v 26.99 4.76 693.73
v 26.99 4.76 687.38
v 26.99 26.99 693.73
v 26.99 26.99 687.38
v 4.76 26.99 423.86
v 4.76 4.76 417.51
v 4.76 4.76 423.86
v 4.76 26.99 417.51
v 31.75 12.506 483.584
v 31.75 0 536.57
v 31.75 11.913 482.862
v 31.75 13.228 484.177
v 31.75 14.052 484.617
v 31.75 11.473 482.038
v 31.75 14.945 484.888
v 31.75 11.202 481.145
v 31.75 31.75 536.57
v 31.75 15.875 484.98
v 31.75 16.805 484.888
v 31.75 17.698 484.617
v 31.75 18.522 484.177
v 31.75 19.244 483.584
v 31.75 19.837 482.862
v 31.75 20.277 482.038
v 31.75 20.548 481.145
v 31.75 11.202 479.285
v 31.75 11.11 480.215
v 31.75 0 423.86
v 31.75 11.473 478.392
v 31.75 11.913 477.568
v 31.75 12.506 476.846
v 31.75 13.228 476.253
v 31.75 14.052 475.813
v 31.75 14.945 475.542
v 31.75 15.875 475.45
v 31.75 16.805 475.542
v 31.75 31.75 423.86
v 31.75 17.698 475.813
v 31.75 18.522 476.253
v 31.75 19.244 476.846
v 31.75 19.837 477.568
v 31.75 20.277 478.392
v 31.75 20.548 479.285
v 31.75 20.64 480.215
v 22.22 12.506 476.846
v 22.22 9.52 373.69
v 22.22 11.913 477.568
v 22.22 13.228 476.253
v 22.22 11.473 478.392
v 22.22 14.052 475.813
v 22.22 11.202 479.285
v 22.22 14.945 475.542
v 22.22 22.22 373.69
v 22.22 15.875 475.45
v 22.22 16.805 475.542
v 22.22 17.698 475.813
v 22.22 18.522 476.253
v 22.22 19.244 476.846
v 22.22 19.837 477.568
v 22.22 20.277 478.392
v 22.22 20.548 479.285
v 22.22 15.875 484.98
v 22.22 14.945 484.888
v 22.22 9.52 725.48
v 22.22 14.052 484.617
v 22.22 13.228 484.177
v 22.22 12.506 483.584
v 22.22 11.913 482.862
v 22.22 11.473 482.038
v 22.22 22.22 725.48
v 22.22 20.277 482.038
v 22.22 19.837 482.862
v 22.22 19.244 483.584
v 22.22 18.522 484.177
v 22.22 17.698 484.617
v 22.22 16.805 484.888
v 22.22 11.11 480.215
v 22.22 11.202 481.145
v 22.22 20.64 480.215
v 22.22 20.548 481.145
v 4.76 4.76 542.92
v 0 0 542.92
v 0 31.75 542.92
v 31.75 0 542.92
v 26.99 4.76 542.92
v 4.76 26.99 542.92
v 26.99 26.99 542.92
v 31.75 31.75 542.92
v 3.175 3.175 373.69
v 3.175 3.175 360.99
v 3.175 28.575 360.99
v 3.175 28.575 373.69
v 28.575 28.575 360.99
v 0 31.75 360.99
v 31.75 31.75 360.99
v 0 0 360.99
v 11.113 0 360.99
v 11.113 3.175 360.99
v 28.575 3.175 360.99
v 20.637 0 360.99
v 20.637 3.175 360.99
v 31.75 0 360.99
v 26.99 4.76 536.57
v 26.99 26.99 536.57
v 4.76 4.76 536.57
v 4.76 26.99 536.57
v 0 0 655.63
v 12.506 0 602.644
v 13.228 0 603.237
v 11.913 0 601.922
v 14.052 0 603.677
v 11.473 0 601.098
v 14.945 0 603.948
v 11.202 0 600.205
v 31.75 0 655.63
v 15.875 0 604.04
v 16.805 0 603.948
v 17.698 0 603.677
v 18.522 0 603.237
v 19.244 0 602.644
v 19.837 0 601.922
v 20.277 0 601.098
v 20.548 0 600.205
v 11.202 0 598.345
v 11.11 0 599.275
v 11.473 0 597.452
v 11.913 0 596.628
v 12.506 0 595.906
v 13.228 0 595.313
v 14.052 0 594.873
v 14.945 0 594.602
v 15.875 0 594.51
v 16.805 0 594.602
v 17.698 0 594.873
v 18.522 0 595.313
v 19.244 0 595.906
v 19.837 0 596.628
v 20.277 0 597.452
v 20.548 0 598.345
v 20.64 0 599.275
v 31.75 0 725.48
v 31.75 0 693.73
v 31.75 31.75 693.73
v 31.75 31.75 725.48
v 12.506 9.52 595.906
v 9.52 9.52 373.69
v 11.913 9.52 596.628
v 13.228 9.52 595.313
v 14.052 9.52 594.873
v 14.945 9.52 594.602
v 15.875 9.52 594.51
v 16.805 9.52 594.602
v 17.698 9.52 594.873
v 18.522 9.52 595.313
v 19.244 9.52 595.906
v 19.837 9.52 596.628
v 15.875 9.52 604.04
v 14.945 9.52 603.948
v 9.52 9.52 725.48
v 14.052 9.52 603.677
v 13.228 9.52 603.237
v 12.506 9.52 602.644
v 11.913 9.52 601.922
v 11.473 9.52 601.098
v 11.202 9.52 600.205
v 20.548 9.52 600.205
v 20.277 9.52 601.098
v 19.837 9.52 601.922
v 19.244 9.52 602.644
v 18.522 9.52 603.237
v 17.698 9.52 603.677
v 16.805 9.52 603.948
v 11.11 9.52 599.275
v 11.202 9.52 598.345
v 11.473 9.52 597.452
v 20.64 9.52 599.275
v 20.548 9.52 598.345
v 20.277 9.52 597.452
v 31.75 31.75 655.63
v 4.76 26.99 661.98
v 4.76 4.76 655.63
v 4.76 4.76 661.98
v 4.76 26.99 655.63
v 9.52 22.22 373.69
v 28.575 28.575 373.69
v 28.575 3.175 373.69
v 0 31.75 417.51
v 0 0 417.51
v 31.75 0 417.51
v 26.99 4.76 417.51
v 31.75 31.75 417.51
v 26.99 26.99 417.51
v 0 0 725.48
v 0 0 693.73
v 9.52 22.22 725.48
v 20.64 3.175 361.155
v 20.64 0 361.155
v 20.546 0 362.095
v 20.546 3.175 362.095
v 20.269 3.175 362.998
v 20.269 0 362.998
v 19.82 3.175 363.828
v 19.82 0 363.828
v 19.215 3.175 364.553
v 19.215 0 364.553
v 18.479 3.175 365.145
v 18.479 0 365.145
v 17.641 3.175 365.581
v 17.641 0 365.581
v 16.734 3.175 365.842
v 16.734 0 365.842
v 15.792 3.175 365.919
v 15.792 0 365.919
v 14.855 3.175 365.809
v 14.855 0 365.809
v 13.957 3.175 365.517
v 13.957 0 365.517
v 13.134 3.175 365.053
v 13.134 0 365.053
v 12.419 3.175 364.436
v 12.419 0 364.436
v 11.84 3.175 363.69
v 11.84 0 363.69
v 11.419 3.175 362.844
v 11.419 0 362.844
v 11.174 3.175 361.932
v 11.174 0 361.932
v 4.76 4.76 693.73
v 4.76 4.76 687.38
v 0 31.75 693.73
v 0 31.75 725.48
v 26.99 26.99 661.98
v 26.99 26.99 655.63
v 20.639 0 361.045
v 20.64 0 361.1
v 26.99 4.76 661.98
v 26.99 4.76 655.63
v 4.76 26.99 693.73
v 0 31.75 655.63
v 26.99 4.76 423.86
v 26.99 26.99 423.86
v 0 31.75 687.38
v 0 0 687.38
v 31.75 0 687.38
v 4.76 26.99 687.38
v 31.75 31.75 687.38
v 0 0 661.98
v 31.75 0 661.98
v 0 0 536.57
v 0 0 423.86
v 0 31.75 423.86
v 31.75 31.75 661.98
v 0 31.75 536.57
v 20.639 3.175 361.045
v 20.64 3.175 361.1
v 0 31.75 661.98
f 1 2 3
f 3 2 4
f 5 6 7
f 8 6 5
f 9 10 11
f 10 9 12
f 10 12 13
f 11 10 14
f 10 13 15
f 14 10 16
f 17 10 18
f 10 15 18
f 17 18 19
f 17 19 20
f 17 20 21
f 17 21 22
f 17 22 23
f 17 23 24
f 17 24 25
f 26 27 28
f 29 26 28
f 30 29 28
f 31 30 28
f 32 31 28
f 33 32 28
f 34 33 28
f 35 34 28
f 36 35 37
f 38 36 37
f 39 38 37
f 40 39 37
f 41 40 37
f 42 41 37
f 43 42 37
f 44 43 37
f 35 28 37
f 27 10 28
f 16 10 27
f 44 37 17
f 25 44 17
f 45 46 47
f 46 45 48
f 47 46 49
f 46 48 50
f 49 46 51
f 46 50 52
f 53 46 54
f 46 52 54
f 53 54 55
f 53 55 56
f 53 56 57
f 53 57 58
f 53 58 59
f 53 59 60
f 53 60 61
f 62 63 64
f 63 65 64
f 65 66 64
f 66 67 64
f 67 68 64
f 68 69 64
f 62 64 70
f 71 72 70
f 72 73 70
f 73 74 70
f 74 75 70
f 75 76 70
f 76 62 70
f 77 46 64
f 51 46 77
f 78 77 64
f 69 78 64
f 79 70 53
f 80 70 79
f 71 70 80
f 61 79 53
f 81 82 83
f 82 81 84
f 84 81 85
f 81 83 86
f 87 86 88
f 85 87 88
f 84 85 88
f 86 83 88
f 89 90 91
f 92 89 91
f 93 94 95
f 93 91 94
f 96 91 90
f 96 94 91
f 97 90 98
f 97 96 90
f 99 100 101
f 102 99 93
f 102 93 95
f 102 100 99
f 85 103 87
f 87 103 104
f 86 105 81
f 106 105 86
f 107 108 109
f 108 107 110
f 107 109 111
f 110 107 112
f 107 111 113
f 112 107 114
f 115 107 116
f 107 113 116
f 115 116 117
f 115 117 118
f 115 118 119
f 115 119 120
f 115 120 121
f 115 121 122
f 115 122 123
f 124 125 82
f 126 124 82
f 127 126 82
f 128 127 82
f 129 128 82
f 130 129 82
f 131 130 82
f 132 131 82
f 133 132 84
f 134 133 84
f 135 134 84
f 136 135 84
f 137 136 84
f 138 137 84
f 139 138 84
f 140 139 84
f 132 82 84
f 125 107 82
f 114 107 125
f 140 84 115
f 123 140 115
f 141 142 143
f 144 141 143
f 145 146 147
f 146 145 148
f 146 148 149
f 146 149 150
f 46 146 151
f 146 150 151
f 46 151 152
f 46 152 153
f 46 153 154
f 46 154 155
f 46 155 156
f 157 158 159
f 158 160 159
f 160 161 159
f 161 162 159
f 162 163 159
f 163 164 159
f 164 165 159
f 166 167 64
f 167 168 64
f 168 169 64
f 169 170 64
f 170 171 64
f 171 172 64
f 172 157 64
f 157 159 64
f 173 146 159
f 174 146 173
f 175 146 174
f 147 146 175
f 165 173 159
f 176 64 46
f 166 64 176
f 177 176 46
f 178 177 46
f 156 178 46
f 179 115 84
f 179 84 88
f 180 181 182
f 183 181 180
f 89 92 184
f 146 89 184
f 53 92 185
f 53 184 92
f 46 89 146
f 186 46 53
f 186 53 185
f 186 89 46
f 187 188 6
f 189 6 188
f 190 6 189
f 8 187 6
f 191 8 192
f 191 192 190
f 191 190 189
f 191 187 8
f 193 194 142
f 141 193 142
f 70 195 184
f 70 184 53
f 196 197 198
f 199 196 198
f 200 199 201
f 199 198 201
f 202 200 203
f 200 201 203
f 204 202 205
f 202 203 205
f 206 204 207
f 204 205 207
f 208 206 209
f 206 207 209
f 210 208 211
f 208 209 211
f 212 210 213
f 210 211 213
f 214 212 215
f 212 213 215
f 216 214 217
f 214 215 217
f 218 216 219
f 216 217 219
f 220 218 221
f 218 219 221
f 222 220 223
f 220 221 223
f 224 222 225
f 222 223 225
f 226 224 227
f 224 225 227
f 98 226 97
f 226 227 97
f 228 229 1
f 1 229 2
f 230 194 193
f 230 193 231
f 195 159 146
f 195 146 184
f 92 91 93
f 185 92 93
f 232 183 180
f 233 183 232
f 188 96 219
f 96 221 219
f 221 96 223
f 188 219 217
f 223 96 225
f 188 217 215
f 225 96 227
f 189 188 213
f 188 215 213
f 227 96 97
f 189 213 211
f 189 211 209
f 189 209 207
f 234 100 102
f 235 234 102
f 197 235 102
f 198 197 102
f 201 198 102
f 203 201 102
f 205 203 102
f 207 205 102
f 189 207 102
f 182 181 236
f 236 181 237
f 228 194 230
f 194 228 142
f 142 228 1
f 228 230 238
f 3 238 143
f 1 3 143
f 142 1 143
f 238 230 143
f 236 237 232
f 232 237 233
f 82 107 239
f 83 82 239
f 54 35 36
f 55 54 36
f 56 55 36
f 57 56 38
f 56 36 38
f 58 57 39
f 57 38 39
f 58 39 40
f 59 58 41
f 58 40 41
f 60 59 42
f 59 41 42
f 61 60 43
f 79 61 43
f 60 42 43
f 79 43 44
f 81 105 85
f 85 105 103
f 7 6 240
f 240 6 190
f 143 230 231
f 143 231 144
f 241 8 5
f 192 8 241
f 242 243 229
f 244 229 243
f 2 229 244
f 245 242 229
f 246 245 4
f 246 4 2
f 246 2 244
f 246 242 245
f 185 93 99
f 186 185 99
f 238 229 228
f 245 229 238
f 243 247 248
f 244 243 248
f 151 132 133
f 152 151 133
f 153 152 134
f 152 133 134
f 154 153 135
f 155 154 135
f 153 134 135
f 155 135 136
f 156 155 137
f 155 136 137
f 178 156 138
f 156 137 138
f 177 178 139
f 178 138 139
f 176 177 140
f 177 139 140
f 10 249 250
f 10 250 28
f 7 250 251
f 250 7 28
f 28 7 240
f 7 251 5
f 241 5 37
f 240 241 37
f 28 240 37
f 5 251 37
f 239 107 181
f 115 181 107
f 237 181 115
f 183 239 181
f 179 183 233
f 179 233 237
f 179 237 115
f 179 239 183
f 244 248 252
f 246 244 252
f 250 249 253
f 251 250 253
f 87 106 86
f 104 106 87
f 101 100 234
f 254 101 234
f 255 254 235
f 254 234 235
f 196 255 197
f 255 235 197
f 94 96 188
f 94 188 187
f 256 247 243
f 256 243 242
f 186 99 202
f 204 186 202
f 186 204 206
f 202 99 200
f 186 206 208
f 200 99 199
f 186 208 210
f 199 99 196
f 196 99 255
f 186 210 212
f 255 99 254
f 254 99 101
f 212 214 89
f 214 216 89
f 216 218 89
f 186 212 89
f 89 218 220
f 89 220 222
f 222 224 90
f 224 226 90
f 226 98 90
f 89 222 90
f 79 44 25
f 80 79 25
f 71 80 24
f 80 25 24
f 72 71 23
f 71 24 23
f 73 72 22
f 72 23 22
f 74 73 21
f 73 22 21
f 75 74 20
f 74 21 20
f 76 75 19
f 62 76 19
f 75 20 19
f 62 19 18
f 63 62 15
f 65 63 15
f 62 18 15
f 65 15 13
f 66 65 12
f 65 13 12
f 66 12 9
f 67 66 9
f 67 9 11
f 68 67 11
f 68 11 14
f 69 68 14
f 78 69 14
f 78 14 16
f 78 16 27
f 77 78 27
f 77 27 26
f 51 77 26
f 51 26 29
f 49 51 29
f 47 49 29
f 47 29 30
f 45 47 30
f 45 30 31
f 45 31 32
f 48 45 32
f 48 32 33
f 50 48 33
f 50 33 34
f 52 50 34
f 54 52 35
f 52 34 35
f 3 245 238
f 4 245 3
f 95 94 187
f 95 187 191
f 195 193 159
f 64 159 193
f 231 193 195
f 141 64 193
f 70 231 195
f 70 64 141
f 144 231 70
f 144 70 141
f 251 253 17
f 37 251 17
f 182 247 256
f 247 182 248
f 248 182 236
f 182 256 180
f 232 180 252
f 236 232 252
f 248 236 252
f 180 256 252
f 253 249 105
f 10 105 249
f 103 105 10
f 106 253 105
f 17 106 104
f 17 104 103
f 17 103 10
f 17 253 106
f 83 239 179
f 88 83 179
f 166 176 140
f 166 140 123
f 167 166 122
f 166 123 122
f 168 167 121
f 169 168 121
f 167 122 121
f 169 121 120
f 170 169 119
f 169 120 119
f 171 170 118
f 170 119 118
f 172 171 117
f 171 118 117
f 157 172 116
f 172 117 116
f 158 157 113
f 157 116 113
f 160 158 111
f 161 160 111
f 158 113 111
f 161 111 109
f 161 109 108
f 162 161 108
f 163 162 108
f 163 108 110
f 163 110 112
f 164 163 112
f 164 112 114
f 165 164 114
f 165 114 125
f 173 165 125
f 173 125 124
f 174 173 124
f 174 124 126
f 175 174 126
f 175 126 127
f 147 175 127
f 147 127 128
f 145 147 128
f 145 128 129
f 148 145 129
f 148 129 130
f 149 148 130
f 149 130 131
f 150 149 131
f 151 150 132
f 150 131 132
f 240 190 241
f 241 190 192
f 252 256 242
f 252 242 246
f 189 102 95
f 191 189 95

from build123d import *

# Parameters (mm, degrees)
F0_W      = 31.75
F0_H      = 31.75
F1_DEPTH  = 60.33
F2_W      = 22.23
F2_H      = 22.23
F3_DEPTH  = 6.35
F4_W      = 31.75
F4_H      = 31.75
F5_DEPTH  = 112.71
F6_W      = 22.23
F6_H      = 22.23
F7_DEPTH  = 6.35
F8_W      = 31.75
F8_H      = 31.75
F8_W_2    = 22.23
F8_H_2    = 22.23
F9_DEPTH  = 112.71
F10_W     = 22.23
F10_H     = 22.23
F11_DEPTH = 6.35
F12_W     = 31.75
F12_H     = 31.75
F12_W_2   = 22.23
F12_H_2   = 22.23
F13_DEPTH = 112.71
F14_W     = 22.23
F14_H     = 22.23
F15_DEPTH = 6.35
F16_W     = 31.75
F16_H     = 31.75
F17_DEPTH = 112.71
F18_W     = 22.23
F18_H     = 22.23
F19_DEPTH = 6.35
F20_W     = 31.75
F20_H     = 31.75
F20_W_2   = 22.23
F20_H_2   = 22.23
F21_DEPTH = 112.71
F22_W     = 22.23
F22_H     = 22.23
F23_DEPTH = 6.35
F24_W     = 31.75
F24_H     = 31.75
F24_W_2   = 22.23
F24_H_2   = 22.23
F25_DEPTH = 25.4
F26_W     = 22.23
F26_H     = 22.23
F27_DEPTH = 6.35
F28_W     = 31.75
F28_H     = 31.75
F28_W_2   = 22.23
F28_H_2   = 22.23
F29_DEPTH = 31.75
F32_DEPTH = 12.7
F34_DEPTH = 12.7
F36_DEPTH = 12.7
F38_DEPTH = 12.7
F40_DEPTH = 12.7
F41_W     = 12.7
F41_H     = 12.7
F42_DEPTH = 736.6
F43_DEPTH = 6.35
F44_W     = 31.75
F44_H     = 360.990007
F45_DEPTH = 76.2
F47_DEPTH = 12.7


with BuildPart() as f1:
    # F0 (on Top) → F1 (new body)
    with BuildSketch(Plane.XY):
        with Locations((15.875, 15.875)):
            Rectangle(F0_W, F0_H)
    extrude(amount=F1_DEPTH)

    # F2 (on face) → F3 (join)
    with BuildSketch(Plane.XY.offset(60.33)):
        with Locations((15.875, 15.875)):
            Rectangle(F2_W, F2_H)
    extrude(amount=F3_DEPTH)

    # F4 (on face) → F5 (join)
    with BuildSketch(Plane.XY.offset(66.68)):
        with Locations((15.875, 15.875)):
            Rectangle(F4_W, F4_H)
    extrude(amount=F5_DEPTH)

    # F6 (on face) → F7 (join)
    with BuildSketch(Plane.XY.offset(179.39)):
        with Locations((15.875, 15.875)):
            Rectangle(F6_W, F6_H)
    extrude(amount=F7_DEPTH)

    # F8 (on face) → F9 (join)
    with BuildSketch(Plane.XY.offset(185.74)):
        with Locations((15.875, 15.875)):
            Rectangle(F8_W, F8_H)
        with Locations((15.875, 15.875)):
            Rectangle(F8_W_2, F8_H_2, mode=Mode.SUBTRACT)
        with Locations((15.875, 15.875)):
            Rectangle(F8_W_2, F8_H_2)
    extrude(amount=F9_DEPTH)

    # F10 (on face) → F11 (join)
    with BuildSketch(Plane.XY.offset(298.45)):
        with Locations((15.875, 15.875)):
            Rectangle(F10_W, F10_H)
    extrude(amount=F11_DEPTH)

    # F12 (on face) → F13 (join)
    with BuildSketch(Plane.XY.offset(304.8)):
        with Locations((15.875, 15.875)):
            Rectangle(F12_W, F12_H)
        with Locations((15.875, 15.875)):
            Rectangle(F12_W_2, F12_H_2, mode=Mode.SUBTRACT)
        with Locations((15.875, 15.875)):
            Rectangle(F12_W_2, F12_H_2)
    extrude(amount=F13_DEPTH)

    # F14 (on face) → F15 (join)
    with BuildSketch(Plane.XY.offset(417.51)):
        with Locations((15.875, 15.875)):
            Rectangle(F14_W, F14_H)
    extrude(amount=F15_DEPTH)

    # F16 (on face) → F17 (join)
    with BuildSketch(Plane.XY.offset(423.86)):
        with Locations((15.875, 15.875)):
            Rectangle(F16_W, F16_H)
    extrude(amount=F17_DEPTH)

    # F18 (on face) → F19 (join)
    with BuildSketch(Plane.XY.offset(536.57)):
        with Locations((15.875, 15.875)):
            Rectangle(F18_W, F18_H)
    extrude(amount=F19_DEPTH)

    # F20 (on face) → F21 (join)
    with BuildSketch(Plane.XY.offset(542.92)):
        with Locations((15.875, 15.875)):
            Rectangle(F20_W, F20_H)
        with Locations((15.875, 15.875)):
            Rectangle(F20_W_2, F20_H_2, mode=Mode.SUBTRACT)
        with Locations((15.875, 15.875)):
            Rectangle(F20_W_2, F20_H_2)
    extrude(amount=F21_DEPTH)

    # F22 (on face) → F23 (join)
    with BuildSketch(Plane.XY.offset(655.63)):
        with Locations((15.875, 15.875)):
            Rectangle(F22_W, F22_H)
    extrude(amount=F23_DEPTH)

    # F24 (on face) → F25 (join)
    with BuildSketch(Plane.XY.offset(661.98)):
        with Locations((15.875, 15.875)):
            Rectangle(F24_W, F24_H)
        with Locations((15.875, 15.875)):
            Rectangle(F24_W_2, F24_H_2, mode=Mode.SUBTRACT)
        with Locations((15.875, 15.875)):
            Rectangle(F24_W_2, F24_H_2)
    extrude(amount=F25_DEPTH)

    # F26 (on face) → F27 (join)
    with BuildSketch(Plane.XY.offset(687.38)):
        with Locations((15.875, 15.875)):
            Rectangle(F26_W, F26_H)
    extrude(amount=F27_DEPTH)

    # F28 (on face) → F29 (join)
    with BuildSketch(Plane.XY.offset(693.73)):
        with Locations((15.875, 15.875)):
            Rectangle(F28_W, F28_H)
        with Locations((15.875, 15.875)):
            Rectangle(F28_W_2, F28_H_2, mode=Mode.SUBTRACT)
        with Locations((15.875, 15.875)):
            Rectangle(F28_W_2, F28_H_2)
    extrude(amount=F29_DEPTH)

    # F31 (on face) → F32 (cut)
    with BuildSketch(Plane.XZ):
        with BuildLine():
            Line((15.875, 123.035), (20.64, 123.035))
            ThreePointArc((20.64, 123.035), (12.5056361876, 126.4043638124), (15.875, 118.27))
            Line((15.875, 118.27), (15.875, 123.035))
        make_face()
        with BuildLine():
            ThreePointArc((15.875, 118.27), (19.2443638124, 119.6656361876), (20.64, 123.035))
            Line((20.64, 123.035), (15.875, 123.035))
            Line((15.875, 123.035), (15.875, 118.27))
        make_face()
    extrude(amount=-F32_DEPTH, mode=Mode.SUBTRACT)

    # F33 (on face) → F34 (cut)
    with BuildSketch(Plane.YZ.offset(31.75)):
        with BuildLine():
            Line((15.875, 242.095), (20.64, 242.095))
            ThreePointArc((20.64, 242.095), (12.5056361876, 245.4643638124), (15.875, 237.33))
            Line((15.875, 237.33), (15.875, 242.095))
        make_face()
        with BuildLine():
            ThreePointArc((15.875, 237.33), (19.2443638124, 238.7256361876), (20.64, 242.095))
            Line((20.64, 242.095), (15.875, 242.095))
            Line((15.875, 242.095), (15.875, 237.33))
        make_face()
    extrude(amount=-F34_DEPTH, mode=Mode.SUBTRACT)

    # F35 (on face) → F36 (cut)
    with BuildSketch(Plane.XZ):
        with BuildLine():
            Line((15.875, 361.155), (20.64, 361.155))
            ThreePointArc((20.64, 361.155), (12.5056361876, 364.5243638124), (15.875, 356.39))
            Line((15.875, 356.39), (15.875, 361.155))
        make_face()
        with BuildLine():
            ThreePointArc((15.875, 356.39), (19.2443638124, 357.7856361876), (20.64, 361.155))
            Line((20.64, 361.155), (15.875, 361.155))
            Line((15.875, 361.155), (15.875, 356.39))
        make_face()
    extrude(amount=-F36_DEPTH, mode=Mode.SUBTRACT)

    # F37 (on face) → F38 (cut)
    with BuildSketch(Plane.YZ.offset(31.75)):
        with BuildLine():
            Line((15.875, 480.215), (20.64, 480.215))
            ThreePointArc((20.64, 480.215), (12.5056361876, 483.5843638124), (15.875, 475.45))
            Line((15.875, 475.45), (15.875, 480.215))
        make_face()
        with BuildLine():
            ThreePointArc((15.875, 475.45), (19.2443638124, 476.8456361876), (20.64, 480.215))
            Line((20.64, 480.215), (15.875, 480.215))
            Line((15.875, 480.215), (15.875, 475.45))
        make_face()
    extrude(amount=-F38_DEPTH, mode=Mode.SUBTRACT)

    # F39 (on face) → F40 (cut)
    with BuildSketch(Plane.XZ):
        with BuildLine():
            Line((15.875, 599.275), (20.64, 599.275))
            ThreePointArc((20.64, 599.275), (12.5056361876, 602.6443638124), (15.875, 594.51))
            Line((15.875, 594.51), (15.875, 599.275))
        make_face()
        with BuildLine():
            ThreePointArc((15.875, 594.51), (19.2443638124, 595.9056361876), (20.64, 599.275))
            Line((20.64, 599.275), (15.875, 599.275))
            Line((15.875, 599.275), (15.875, 594.51))
        make_face()
    extrude(amount=-F40_DEPTH, mode=Mode.SUBTRACT)

    # F41 (on face) → F42 (cut)
    with BuildSketch(Plane.XY.offset(725.48)):
        with Locations((15.87, 15.87)):
            Rectangle(F41_W, F41_H)
    extrude(amount=-F42_DEPTH, mode=Mode.SUBTRACT)

    # F30 (on face) → F43 (cut)
    with BuildSketch(Plane(origin=(0, 0, 0), x_dir=(1, 0, 0), z_dir=(0, 0, -1))):
        with BuildLine():
            ThreePointArc((6.35, -15.875), (9.1398079092, -22.6101920908), (15.875, -25.4))
            Line((15.875, -25.4), (15.875, -15.875))
            Line((15.875, -15.875), (6.35, -15.875))
        make_face()
        with BuildLine():
            Line((15.875, -15.875), (15.875, -25.4))
            ThreePointArc((15.875, -25.4), (22.6101920908, -22.6101920908), (25.4, -15.875))
            ThreePointArc((25.4, -15.875), (15.875, -6.35), (6.35, -15.875))
            Line((6.35, -15.875), (15.875, -15.875))
        make_face()
    extrude(amount=-F43_DEPTH, mode=Mode.SUBTRACT)

    # F44 (on face) → F45 (cut)
    with BuildSketch(Plane.XZ):
        with Locations((15.875, 180.4950035)):
            Rectangle(F44_W, F44_H)
    extrude(amount=-F45_DEPTH, mode=Mode.SUBTRACT)

    # F46 (on face) → F47 (cut)
    with BuildSketch(Plane(origin=(0, 0, 360.990007), x_dir=(1, 0, 0), z_dir=(0, 0, -1))):
        Polygon((11.1128573824, -9.52), (11.1128573824, -3.175), (3.175, -3.175), (3.175, -28.575), (28.575, -28.575), (28.575, -3.175), (20.6371426176, -3.175), (20.6371426176, -9.52), (22.22, -9.52), (22.22, -22.22), (9.52, -22.22), (9.52, -9.52), align=None)
        Polygon((20.6371426176, -3.175), (11.1128573824, -3.175), (11.1128573824, -9.52), (9.52, -9.52), (9.52, -22.22), (22.22, -22.22), (22.22, -9.52), (20.6371426176, -9.52), align=None)
    extrude(amount=-F47_DEPTH, mode=Mode.SUBTRACT)


solid = f1.part
